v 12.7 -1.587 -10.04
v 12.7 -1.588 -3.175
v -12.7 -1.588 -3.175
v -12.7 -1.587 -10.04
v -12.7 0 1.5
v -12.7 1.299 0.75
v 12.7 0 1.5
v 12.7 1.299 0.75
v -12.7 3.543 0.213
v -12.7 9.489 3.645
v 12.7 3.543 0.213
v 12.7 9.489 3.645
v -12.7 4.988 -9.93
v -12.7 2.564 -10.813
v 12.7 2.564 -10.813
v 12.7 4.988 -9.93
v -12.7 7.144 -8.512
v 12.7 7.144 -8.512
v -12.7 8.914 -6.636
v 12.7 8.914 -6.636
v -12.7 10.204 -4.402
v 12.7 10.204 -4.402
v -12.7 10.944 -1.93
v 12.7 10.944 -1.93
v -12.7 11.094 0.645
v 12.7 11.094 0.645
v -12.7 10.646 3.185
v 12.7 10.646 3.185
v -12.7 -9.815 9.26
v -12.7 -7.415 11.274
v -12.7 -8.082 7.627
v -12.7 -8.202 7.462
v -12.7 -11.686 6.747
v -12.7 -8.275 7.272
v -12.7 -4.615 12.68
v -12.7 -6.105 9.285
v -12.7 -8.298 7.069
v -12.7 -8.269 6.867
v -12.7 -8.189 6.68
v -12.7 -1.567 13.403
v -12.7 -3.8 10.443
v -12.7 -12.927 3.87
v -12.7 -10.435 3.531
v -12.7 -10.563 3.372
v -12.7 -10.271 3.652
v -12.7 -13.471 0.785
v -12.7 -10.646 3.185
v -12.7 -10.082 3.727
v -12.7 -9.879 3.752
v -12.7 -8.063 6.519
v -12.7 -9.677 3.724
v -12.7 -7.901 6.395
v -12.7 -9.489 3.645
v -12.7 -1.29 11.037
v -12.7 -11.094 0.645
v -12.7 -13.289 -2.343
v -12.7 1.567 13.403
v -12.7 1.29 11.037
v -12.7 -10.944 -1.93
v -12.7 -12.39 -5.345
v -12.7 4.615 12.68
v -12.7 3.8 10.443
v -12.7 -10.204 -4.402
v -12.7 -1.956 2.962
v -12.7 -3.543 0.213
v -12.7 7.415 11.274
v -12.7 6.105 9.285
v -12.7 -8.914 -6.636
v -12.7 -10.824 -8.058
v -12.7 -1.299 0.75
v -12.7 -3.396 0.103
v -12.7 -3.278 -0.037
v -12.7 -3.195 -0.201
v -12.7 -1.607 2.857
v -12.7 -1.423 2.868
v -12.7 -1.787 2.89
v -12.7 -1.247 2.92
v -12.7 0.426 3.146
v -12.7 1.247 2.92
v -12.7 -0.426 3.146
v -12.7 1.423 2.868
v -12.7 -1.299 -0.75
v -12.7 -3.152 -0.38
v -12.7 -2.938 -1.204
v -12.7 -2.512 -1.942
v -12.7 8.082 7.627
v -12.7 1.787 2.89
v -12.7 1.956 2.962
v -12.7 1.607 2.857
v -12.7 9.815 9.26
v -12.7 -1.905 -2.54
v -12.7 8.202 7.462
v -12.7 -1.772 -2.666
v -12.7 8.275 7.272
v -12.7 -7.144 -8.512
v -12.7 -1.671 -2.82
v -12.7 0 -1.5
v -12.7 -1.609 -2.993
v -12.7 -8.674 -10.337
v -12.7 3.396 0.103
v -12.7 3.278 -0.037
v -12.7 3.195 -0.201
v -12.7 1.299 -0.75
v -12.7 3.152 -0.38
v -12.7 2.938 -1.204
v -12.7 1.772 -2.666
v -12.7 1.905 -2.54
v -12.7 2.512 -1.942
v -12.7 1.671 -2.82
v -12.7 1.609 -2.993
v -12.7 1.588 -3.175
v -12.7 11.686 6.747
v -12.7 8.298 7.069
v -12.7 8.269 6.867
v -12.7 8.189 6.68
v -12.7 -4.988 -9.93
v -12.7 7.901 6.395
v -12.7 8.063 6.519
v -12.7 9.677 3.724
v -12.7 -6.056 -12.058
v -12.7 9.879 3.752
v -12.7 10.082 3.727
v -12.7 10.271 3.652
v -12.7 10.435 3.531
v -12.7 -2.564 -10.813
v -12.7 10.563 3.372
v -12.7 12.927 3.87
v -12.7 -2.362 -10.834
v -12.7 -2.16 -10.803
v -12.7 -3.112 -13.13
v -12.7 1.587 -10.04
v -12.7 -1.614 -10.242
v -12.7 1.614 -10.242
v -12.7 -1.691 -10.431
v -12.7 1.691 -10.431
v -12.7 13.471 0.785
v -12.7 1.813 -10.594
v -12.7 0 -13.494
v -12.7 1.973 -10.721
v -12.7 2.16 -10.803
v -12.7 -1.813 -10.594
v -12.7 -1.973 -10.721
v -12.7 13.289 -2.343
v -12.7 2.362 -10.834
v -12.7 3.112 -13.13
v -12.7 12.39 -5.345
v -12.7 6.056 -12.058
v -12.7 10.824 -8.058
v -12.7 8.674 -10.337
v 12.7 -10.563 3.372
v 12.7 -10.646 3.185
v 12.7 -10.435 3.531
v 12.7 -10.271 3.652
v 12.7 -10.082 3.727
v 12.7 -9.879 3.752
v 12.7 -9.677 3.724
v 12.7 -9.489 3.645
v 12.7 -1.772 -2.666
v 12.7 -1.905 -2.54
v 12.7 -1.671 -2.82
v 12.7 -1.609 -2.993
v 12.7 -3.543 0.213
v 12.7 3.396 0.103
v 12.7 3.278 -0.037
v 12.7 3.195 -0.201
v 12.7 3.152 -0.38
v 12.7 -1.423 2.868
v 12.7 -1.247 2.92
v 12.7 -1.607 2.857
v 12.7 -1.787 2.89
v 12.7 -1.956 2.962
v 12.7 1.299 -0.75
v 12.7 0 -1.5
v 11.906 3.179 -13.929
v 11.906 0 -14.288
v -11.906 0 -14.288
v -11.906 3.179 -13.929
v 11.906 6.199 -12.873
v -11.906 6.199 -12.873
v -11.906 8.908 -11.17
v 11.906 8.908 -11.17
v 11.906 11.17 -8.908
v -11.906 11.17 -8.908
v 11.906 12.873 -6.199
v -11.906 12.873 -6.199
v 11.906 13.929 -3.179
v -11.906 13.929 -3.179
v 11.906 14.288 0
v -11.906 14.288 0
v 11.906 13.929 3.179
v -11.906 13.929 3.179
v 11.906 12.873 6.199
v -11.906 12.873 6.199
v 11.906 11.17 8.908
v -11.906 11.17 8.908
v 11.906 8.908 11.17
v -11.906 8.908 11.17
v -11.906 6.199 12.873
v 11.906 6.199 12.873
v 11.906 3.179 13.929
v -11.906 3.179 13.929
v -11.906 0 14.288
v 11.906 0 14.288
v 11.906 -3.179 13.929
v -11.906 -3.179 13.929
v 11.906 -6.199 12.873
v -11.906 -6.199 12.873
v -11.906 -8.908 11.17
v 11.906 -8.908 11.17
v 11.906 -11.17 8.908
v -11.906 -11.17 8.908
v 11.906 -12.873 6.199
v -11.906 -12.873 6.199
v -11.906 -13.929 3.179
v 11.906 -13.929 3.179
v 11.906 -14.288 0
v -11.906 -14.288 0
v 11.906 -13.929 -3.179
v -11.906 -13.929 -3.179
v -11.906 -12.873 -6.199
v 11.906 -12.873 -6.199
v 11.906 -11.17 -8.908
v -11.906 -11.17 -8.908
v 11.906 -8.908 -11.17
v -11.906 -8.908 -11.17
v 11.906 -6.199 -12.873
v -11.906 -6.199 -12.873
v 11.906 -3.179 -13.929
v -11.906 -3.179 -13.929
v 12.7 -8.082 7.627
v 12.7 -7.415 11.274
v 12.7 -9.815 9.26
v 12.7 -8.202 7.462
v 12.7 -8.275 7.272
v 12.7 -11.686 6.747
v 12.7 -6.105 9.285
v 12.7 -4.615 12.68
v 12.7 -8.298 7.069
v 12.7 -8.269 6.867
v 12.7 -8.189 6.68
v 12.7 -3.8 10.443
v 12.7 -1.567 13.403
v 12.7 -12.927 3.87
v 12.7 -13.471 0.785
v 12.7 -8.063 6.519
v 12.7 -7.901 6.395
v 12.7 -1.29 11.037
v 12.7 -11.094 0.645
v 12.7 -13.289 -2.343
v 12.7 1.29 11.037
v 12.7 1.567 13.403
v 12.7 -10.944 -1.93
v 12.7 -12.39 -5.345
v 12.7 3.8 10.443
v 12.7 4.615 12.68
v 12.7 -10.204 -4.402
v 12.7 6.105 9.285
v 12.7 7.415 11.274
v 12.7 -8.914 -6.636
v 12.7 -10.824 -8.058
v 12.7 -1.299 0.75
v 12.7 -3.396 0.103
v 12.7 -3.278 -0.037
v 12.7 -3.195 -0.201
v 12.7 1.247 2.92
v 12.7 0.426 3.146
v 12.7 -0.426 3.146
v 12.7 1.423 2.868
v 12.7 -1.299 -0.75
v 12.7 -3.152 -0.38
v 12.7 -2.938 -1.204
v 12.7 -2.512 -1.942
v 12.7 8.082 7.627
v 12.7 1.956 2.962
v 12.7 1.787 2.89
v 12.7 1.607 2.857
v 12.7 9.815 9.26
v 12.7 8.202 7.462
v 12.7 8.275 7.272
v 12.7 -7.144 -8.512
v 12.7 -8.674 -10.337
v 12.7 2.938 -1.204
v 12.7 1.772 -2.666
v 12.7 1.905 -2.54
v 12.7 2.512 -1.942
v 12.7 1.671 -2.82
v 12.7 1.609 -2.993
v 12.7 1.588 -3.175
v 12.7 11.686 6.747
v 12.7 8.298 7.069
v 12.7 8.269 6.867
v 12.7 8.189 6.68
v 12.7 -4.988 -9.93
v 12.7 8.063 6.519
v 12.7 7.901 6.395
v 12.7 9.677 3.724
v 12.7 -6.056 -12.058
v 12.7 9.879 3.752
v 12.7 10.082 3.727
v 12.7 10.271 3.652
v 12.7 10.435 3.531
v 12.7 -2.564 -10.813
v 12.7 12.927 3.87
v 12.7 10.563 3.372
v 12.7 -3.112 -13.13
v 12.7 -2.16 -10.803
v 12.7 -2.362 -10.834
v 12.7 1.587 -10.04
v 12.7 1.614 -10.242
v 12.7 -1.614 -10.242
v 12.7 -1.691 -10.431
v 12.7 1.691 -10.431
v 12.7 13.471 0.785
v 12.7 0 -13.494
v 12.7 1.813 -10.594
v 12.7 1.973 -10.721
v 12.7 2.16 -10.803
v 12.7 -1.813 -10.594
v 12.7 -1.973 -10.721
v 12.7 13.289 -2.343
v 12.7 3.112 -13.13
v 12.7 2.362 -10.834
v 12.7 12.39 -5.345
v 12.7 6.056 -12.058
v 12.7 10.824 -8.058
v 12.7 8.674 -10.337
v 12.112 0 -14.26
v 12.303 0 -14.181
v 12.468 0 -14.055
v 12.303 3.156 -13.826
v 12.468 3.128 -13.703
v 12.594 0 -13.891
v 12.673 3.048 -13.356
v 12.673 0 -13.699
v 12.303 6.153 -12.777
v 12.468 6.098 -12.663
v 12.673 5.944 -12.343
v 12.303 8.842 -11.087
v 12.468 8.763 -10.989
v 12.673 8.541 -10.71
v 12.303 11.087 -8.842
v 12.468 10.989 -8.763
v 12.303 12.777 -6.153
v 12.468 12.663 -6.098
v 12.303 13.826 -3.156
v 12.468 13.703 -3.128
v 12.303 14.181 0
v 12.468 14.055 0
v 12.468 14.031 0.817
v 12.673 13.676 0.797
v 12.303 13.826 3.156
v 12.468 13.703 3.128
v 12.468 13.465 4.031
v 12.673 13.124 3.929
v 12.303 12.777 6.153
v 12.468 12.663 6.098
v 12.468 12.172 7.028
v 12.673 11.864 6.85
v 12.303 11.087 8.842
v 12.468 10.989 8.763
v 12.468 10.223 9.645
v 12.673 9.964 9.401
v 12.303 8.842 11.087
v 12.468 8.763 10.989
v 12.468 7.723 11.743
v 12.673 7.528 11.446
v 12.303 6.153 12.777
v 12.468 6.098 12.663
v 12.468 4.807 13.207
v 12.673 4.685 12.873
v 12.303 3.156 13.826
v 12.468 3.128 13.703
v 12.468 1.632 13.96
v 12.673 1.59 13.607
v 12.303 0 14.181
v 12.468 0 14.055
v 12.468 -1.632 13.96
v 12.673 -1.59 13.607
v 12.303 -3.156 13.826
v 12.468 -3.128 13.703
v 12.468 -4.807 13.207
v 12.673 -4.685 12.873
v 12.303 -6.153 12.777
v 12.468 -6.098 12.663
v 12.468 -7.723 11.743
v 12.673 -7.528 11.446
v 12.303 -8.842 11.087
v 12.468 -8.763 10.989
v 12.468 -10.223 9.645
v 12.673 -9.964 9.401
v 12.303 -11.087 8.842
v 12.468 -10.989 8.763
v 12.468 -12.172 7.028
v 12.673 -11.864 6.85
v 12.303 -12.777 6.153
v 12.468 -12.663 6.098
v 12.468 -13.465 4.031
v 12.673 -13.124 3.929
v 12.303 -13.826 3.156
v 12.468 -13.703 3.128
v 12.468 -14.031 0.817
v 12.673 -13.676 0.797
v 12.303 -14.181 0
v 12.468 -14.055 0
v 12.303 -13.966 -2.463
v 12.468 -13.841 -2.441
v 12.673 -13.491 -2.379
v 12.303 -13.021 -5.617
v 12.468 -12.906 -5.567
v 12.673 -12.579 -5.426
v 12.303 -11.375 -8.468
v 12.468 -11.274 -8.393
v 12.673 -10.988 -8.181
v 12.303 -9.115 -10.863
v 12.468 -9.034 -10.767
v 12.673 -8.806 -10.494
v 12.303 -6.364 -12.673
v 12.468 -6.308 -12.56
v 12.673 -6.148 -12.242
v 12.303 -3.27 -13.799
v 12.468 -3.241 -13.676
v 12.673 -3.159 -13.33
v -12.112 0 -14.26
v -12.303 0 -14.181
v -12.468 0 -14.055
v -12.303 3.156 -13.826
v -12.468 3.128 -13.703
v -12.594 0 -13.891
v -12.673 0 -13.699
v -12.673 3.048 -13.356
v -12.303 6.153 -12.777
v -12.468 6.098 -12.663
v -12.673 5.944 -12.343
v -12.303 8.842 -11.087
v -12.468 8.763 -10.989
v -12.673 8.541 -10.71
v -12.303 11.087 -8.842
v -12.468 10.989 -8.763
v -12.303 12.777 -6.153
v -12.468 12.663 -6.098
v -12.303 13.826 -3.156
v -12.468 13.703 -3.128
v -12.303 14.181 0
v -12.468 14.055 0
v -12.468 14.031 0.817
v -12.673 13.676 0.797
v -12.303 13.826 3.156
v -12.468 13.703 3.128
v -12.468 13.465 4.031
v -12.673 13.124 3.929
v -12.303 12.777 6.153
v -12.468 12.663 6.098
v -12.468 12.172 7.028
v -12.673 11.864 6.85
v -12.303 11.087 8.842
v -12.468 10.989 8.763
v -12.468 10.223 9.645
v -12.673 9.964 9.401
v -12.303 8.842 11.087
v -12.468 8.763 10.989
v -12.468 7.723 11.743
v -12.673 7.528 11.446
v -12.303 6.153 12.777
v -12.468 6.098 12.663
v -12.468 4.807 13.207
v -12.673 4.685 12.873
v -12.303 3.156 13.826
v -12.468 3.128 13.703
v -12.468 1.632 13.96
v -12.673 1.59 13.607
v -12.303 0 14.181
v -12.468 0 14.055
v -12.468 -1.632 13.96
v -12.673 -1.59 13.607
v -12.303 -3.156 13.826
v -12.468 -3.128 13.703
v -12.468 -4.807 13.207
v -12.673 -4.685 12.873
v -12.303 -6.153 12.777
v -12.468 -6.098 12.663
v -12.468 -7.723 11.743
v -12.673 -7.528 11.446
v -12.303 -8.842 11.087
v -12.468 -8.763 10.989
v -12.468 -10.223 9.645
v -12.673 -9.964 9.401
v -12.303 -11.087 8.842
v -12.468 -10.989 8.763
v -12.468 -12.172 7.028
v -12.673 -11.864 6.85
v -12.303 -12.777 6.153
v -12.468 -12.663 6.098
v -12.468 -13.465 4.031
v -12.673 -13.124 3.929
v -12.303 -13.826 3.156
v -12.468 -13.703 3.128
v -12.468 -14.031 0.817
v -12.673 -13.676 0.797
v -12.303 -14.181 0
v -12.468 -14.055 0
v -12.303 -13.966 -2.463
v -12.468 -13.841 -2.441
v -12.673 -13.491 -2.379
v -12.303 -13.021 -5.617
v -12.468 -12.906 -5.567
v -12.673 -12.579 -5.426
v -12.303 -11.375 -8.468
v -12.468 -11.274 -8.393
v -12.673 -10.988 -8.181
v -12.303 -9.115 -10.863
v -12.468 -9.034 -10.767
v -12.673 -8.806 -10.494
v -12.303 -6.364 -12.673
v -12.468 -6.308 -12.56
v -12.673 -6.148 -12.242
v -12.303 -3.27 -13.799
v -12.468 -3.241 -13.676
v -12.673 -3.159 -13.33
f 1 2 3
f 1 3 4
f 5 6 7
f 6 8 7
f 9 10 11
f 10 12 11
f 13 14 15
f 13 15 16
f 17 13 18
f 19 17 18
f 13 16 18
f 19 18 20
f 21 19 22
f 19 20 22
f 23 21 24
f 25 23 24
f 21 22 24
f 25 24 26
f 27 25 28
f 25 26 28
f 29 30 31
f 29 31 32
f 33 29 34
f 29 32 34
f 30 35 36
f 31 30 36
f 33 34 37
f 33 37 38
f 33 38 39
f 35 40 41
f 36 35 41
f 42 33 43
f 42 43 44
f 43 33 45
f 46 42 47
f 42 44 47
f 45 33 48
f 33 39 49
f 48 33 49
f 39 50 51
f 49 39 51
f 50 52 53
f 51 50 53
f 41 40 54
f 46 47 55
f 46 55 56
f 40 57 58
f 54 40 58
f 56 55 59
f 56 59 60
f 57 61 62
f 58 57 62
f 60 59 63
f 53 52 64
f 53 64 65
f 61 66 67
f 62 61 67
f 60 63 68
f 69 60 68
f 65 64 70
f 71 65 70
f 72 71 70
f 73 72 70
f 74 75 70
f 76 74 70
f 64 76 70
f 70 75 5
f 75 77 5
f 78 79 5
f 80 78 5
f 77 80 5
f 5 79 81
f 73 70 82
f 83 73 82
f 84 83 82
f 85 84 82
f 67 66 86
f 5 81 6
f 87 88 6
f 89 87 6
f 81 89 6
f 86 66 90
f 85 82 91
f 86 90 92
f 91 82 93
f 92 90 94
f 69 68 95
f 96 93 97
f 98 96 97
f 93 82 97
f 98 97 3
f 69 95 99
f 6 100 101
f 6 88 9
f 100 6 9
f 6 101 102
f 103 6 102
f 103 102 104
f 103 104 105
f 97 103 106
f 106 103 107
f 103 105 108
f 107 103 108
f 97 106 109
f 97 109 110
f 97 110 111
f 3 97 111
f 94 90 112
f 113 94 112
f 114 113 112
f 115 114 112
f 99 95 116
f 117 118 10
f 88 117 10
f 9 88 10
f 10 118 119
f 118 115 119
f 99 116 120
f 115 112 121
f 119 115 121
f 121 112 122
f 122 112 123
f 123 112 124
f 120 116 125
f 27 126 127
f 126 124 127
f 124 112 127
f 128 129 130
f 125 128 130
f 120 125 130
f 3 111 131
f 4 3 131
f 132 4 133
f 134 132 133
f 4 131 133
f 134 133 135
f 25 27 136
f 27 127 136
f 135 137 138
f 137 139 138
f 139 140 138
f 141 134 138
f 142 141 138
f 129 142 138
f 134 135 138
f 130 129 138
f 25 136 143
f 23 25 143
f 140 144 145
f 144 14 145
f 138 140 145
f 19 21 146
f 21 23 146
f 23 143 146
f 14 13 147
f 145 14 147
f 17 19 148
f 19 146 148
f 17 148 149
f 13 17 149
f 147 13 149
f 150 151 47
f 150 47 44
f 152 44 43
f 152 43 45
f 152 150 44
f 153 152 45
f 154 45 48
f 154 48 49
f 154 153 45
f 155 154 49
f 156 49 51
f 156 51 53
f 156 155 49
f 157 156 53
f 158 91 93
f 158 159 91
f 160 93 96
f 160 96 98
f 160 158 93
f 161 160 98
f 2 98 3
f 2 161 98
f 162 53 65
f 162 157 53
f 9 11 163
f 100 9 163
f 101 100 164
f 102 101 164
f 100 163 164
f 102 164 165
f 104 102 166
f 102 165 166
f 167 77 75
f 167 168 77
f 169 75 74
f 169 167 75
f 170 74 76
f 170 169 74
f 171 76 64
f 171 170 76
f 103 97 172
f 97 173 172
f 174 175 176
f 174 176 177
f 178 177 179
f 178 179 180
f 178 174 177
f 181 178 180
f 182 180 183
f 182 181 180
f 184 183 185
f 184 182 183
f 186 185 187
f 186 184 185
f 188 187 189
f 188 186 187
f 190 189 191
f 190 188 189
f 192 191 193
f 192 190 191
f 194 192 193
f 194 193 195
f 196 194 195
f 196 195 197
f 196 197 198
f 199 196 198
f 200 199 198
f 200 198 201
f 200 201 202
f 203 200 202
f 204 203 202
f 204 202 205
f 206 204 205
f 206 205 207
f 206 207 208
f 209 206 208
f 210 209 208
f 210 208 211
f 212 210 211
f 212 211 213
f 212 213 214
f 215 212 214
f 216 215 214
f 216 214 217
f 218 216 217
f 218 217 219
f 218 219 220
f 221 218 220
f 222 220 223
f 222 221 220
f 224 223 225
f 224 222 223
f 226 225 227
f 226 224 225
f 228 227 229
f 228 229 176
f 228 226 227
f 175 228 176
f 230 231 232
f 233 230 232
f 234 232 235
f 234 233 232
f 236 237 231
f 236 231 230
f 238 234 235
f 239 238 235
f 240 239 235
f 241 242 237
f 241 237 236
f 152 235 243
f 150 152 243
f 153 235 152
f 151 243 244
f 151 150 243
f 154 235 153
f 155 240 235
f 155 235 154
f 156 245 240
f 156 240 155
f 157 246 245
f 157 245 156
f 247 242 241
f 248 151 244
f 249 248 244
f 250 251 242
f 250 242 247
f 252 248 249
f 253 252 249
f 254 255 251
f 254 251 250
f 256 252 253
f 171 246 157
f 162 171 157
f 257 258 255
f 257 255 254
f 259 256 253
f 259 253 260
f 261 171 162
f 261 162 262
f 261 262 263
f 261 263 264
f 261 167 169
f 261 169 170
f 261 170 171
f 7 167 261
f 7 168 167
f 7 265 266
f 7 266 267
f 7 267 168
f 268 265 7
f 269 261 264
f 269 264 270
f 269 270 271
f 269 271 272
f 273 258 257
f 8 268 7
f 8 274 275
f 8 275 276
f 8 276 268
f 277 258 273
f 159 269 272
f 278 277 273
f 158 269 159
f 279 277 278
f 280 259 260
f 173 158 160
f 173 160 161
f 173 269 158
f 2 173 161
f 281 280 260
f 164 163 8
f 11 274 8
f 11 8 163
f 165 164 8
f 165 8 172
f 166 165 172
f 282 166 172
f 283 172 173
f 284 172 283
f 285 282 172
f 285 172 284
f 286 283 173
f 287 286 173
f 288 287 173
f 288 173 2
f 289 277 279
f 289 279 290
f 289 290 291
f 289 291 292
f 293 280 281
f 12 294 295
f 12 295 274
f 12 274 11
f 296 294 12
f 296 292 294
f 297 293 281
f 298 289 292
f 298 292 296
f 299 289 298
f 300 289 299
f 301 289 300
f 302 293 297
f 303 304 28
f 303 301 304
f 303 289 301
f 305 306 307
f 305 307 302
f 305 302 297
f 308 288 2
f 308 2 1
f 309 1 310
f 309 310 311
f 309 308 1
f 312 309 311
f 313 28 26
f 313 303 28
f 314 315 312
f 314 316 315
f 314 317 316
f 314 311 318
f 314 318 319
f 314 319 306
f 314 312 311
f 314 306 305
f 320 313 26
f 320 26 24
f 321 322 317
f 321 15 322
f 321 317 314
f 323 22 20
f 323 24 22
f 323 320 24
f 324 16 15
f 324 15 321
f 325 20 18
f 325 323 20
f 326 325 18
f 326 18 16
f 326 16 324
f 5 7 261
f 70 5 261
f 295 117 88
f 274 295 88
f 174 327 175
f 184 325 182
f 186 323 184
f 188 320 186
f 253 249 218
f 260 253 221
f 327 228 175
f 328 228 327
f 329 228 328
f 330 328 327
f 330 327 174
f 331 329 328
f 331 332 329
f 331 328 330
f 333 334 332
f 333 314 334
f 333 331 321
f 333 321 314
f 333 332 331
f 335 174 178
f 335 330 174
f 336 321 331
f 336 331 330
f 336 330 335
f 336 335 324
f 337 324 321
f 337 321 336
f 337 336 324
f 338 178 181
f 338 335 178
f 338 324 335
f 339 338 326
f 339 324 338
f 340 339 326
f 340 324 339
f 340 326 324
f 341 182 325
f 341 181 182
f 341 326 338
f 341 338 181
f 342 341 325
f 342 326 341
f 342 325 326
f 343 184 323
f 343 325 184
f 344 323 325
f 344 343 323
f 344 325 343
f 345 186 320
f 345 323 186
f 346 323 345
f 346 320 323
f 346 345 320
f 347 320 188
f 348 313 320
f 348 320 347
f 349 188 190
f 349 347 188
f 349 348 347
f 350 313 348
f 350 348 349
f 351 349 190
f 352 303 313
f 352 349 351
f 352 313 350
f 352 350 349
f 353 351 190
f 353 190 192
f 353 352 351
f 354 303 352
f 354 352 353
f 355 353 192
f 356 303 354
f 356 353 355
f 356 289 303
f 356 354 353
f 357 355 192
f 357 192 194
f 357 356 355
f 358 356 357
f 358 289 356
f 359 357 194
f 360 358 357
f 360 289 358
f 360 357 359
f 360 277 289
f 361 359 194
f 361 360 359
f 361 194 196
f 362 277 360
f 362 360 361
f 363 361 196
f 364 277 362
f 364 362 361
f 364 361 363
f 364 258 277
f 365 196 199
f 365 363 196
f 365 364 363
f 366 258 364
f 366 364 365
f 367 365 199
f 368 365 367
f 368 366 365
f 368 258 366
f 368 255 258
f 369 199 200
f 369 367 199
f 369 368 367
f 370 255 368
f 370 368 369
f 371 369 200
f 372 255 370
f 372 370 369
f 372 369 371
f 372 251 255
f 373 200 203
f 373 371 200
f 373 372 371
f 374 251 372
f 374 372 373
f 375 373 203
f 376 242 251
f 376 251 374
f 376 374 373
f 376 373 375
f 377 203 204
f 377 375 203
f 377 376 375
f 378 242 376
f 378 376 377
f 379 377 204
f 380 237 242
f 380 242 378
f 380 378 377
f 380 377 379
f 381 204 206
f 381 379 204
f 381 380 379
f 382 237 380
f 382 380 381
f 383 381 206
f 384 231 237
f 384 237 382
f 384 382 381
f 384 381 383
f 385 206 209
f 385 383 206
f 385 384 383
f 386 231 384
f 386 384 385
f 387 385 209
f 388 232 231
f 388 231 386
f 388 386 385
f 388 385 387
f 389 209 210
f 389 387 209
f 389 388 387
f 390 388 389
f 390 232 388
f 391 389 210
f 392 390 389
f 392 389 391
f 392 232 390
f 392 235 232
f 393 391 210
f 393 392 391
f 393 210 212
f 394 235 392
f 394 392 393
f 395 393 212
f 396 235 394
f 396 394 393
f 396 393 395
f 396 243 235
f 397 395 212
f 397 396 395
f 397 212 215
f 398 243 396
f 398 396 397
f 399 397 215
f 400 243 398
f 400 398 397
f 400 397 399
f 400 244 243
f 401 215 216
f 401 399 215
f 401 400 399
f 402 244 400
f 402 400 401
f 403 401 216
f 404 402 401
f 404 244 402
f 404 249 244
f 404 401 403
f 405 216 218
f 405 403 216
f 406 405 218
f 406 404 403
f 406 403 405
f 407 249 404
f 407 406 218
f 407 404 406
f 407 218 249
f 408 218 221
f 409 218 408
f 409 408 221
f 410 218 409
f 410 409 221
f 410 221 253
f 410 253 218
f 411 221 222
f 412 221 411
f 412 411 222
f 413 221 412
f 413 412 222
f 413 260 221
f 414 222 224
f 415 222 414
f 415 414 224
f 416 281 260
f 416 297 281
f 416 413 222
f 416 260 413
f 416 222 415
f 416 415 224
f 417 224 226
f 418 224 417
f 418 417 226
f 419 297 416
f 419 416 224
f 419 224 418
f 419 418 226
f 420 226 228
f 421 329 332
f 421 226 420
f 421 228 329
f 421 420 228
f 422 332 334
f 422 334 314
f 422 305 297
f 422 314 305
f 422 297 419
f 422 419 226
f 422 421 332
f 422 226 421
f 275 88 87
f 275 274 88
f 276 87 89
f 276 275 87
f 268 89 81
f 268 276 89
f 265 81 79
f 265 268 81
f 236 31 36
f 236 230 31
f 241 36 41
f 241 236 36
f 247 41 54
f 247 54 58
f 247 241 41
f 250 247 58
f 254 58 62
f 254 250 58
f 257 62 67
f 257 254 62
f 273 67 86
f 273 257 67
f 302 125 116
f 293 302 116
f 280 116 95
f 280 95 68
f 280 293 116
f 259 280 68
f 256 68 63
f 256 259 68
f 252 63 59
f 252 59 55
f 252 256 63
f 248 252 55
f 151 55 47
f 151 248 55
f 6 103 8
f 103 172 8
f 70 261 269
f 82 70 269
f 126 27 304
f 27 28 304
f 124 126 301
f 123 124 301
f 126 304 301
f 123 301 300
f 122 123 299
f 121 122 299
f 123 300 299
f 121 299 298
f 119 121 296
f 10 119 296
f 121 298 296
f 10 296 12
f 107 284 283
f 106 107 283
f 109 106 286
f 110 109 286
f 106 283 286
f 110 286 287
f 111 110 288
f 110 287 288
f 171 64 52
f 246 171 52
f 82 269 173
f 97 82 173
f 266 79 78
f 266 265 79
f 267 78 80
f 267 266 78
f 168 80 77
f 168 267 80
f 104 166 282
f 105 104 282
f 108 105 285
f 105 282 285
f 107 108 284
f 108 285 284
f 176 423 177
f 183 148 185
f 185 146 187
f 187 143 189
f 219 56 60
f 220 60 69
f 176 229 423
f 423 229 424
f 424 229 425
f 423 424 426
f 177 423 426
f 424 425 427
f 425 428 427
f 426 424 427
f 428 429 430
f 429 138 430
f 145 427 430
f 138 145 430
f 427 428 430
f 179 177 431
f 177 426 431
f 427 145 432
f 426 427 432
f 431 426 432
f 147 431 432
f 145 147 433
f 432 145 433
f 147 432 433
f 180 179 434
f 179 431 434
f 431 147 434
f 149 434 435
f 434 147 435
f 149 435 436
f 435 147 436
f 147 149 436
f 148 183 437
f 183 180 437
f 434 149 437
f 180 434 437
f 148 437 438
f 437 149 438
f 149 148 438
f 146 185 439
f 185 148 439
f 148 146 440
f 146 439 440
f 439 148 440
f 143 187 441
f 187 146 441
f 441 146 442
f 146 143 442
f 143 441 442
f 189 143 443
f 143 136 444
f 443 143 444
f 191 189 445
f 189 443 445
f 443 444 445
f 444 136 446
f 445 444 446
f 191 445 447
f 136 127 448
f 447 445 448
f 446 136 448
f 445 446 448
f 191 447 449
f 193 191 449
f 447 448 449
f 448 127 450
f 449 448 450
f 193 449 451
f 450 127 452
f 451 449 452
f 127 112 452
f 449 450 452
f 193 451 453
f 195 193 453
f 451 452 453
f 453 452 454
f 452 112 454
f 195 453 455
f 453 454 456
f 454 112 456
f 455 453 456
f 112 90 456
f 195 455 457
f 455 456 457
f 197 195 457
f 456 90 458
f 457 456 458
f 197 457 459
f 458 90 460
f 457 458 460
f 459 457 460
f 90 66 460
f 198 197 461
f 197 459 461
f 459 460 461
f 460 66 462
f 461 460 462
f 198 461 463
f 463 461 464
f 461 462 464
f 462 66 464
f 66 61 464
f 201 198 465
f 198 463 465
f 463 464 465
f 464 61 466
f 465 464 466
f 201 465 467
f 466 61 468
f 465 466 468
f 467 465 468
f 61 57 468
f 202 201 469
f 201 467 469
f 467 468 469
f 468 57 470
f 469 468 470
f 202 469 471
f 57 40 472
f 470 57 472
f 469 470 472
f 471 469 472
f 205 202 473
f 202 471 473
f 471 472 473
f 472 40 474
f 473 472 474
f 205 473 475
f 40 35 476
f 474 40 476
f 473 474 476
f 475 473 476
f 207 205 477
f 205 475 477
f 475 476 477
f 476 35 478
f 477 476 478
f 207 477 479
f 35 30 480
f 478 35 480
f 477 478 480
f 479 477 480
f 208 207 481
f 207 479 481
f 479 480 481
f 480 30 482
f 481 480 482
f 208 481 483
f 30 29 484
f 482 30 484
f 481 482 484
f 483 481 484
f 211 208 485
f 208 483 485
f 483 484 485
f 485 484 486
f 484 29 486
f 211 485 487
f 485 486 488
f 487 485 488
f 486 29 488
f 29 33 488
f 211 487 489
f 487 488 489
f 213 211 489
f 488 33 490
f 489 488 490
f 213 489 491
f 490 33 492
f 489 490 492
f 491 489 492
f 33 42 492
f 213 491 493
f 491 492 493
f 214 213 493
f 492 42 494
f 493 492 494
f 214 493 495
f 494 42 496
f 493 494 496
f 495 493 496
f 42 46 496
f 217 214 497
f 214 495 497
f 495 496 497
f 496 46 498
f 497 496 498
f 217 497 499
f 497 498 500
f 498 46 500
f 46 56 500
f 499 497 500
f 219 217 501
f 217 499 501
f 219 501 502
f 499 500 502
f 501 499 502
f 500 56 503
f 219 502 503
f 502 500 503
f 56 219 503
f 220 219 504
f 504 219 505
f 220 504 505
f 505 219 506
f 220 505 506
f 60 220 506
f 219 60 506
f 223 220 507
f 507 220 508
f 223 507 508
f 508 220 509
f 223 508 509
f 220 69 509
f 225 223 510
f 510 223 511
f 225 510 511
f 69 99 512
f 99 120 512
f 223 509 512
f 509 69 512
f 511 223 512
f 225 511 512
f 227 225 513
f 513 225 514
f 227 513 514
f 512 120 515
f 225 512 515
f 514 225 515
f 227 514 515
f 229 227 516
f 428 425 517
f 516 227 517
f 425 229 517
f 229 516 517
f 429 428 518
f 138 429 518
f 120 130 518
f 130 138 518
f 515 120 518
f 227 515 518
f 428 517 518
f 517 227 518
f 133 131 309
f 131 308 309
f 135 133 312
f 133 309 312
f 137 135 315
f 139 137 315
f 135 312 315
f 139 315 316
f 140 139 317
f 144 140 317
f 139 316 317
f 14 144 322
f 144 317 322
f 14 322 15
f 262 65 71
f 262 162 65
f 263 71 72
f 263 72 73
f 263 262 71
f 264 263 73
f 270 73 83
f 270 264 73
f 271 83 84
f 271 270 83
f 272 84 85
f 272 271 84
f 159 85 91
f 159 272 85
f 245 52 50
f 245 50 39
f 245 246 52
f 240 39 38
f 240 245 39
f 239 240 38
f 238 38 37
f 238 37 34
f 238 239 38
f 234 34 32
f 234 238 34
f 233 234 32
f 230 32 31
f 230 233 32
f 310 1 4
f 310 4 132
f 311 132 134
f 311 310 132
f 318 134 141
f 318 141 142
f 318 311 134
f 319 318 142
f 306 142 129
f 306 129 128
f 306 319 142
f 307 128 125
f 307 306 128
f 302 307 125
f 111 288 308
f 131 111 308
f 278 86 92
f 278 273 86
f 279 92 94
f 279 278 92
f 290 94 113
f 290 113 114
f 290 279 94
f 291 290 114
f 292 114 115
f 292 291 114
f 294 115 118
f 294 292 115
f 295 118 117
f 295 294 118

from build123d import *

# Parameters (mm, degrees)
SKETCH1_R           = 14.2875
BOSS_EXTRUDE1_DEPTH = 12.7
FILLET1_R           = 0.79375


with BuildPart() as part:
    # Sketch1 → Boss-Extrude1 (new body, symmetric)
    with BuildSketch(Plane(origin=(0, 0, 0), x_dir=(0, 0, -1), z_dir=(1, 0, 0))):
        Circle(SKETCH1_R)
        Polygon((0.75, -1.299038106), (1.5, 0), (0.75, 1.299038106), (-0.75, 1.299038106), (-1.5, 0), (-0.75, -1.299038106), align=None, mode=Mode.SUBTRACT)
        with BuildLine():
            Line((3.175, 1.5875), (10.040231571, 1.5875))
            ThreePointArc((10.040231571, 1.5875), (10.6629003, 1.888987147), (10.812557076, 2.564423077))
            ThreePointArc((10.812557076, 2.564423077), (5.55625, 9.6237073), (-3.185423008, 10.646160647))
            ThreePointArc((-3.185423008, 10.646160647), (-3.695539293, 10.178836111), (-3.645300457, 9.4888456))
            Line((-3.645300457, 9.4888456), (-0.212684671, 3.543380657))
            ThreePointArc((-0.212684671, 3.543380657), (0.037374782, 3.277861812), (0.379778394, 3.152204526))
            ThreePointArc((0.379778394, 3.152204526), (1.5875, 2.749630657), (2.54, 1.905))
            ThreePointArc((2.54, 1.905), (2.820024209, 1.671298417), (3.175, 1.5875))
        make_face(mode=Mode.SUBTRACT)
        with BuildLine():
            Line((3.175, -1.5875), (10.040231571, -1.5875))
            ThreePointArc((10.040231571, -1.5875), (10.6629003, -1.888987147), (10.812557076, -2.564423077))
            ThreePointArc((10.812557076, -2.564423077), (5.55625, -9.6237073), (-3.185423008, -10.646160647))
            ThreePointArc((-3.185423008, -10.646160647), (-3.695539293, -10.178836111), (-3.645300457, -9.4888456))
            Line((-3.645300457, -9.4888456), (-0.212684671, -3.543380657))
            ThreePointArc((-0.212684671, -3.543380657), (0.037374782, -3.277861812), (0.379778394, -3.152204526))
            ThreePointArc((0.379778394, -3.152204526), (1.5875, -2.749630657), (2.54, -1.905))
            ThreePointArc((2.54, -1.905), (2.820024209, -1.671298417), (3.175, -1.5875))
        make_face(mode=Mode.SUBTRACT)
        with BuildLine():
            Line((-2.962315329, -1.955880657), (-6.394931114, -7.9013456))
            ThreePointArc((-6.394931114, -7.9013456), (-6.967361007, -8.289848964), (-7.627134069, -8.08173757))
            ThreePointArc((-7.627134069, -8.08173757), (-11.1125, 0), (-7.627134069, 8.08173757))
            ThreePointArc((-7.627134069, 8.08173757), (-6.967361007, 8.289848964), (-6.394931114, 7.9013456))
            Line((-6.394931114, 7.9013456), (-2.962315329, 1.955880657))
            ThreePointArc((-2.962315329, 1.955880657), (-2.857398991, 1.606563395), (-2.919778394, 1.247204526))
            ThreePointArc((-2.919778394, 1.247204526), (-3.175, 0), (-2.919778394, -1.247204526))
            ThreePointArc((-2.919778394, -1.247204526), (-2.857398991, -1.606563395), (-2.962315329, -1.955880657))
        make_face(mode=Mode.SUBTRACT)
    extrude(amount=BOSS_EXTRUDE1_DEPTH, both=True)

    # Fillet1
    fillet1_edges = [part.edges().sort_by_distance(p)[0] for p in [
        (-12.7, 0, 14.2875),
        (12.7, 0, 14.2875),
    ]]
    fillet(fillet1_edges, radius=FILLET1_R)


solid = part.part
